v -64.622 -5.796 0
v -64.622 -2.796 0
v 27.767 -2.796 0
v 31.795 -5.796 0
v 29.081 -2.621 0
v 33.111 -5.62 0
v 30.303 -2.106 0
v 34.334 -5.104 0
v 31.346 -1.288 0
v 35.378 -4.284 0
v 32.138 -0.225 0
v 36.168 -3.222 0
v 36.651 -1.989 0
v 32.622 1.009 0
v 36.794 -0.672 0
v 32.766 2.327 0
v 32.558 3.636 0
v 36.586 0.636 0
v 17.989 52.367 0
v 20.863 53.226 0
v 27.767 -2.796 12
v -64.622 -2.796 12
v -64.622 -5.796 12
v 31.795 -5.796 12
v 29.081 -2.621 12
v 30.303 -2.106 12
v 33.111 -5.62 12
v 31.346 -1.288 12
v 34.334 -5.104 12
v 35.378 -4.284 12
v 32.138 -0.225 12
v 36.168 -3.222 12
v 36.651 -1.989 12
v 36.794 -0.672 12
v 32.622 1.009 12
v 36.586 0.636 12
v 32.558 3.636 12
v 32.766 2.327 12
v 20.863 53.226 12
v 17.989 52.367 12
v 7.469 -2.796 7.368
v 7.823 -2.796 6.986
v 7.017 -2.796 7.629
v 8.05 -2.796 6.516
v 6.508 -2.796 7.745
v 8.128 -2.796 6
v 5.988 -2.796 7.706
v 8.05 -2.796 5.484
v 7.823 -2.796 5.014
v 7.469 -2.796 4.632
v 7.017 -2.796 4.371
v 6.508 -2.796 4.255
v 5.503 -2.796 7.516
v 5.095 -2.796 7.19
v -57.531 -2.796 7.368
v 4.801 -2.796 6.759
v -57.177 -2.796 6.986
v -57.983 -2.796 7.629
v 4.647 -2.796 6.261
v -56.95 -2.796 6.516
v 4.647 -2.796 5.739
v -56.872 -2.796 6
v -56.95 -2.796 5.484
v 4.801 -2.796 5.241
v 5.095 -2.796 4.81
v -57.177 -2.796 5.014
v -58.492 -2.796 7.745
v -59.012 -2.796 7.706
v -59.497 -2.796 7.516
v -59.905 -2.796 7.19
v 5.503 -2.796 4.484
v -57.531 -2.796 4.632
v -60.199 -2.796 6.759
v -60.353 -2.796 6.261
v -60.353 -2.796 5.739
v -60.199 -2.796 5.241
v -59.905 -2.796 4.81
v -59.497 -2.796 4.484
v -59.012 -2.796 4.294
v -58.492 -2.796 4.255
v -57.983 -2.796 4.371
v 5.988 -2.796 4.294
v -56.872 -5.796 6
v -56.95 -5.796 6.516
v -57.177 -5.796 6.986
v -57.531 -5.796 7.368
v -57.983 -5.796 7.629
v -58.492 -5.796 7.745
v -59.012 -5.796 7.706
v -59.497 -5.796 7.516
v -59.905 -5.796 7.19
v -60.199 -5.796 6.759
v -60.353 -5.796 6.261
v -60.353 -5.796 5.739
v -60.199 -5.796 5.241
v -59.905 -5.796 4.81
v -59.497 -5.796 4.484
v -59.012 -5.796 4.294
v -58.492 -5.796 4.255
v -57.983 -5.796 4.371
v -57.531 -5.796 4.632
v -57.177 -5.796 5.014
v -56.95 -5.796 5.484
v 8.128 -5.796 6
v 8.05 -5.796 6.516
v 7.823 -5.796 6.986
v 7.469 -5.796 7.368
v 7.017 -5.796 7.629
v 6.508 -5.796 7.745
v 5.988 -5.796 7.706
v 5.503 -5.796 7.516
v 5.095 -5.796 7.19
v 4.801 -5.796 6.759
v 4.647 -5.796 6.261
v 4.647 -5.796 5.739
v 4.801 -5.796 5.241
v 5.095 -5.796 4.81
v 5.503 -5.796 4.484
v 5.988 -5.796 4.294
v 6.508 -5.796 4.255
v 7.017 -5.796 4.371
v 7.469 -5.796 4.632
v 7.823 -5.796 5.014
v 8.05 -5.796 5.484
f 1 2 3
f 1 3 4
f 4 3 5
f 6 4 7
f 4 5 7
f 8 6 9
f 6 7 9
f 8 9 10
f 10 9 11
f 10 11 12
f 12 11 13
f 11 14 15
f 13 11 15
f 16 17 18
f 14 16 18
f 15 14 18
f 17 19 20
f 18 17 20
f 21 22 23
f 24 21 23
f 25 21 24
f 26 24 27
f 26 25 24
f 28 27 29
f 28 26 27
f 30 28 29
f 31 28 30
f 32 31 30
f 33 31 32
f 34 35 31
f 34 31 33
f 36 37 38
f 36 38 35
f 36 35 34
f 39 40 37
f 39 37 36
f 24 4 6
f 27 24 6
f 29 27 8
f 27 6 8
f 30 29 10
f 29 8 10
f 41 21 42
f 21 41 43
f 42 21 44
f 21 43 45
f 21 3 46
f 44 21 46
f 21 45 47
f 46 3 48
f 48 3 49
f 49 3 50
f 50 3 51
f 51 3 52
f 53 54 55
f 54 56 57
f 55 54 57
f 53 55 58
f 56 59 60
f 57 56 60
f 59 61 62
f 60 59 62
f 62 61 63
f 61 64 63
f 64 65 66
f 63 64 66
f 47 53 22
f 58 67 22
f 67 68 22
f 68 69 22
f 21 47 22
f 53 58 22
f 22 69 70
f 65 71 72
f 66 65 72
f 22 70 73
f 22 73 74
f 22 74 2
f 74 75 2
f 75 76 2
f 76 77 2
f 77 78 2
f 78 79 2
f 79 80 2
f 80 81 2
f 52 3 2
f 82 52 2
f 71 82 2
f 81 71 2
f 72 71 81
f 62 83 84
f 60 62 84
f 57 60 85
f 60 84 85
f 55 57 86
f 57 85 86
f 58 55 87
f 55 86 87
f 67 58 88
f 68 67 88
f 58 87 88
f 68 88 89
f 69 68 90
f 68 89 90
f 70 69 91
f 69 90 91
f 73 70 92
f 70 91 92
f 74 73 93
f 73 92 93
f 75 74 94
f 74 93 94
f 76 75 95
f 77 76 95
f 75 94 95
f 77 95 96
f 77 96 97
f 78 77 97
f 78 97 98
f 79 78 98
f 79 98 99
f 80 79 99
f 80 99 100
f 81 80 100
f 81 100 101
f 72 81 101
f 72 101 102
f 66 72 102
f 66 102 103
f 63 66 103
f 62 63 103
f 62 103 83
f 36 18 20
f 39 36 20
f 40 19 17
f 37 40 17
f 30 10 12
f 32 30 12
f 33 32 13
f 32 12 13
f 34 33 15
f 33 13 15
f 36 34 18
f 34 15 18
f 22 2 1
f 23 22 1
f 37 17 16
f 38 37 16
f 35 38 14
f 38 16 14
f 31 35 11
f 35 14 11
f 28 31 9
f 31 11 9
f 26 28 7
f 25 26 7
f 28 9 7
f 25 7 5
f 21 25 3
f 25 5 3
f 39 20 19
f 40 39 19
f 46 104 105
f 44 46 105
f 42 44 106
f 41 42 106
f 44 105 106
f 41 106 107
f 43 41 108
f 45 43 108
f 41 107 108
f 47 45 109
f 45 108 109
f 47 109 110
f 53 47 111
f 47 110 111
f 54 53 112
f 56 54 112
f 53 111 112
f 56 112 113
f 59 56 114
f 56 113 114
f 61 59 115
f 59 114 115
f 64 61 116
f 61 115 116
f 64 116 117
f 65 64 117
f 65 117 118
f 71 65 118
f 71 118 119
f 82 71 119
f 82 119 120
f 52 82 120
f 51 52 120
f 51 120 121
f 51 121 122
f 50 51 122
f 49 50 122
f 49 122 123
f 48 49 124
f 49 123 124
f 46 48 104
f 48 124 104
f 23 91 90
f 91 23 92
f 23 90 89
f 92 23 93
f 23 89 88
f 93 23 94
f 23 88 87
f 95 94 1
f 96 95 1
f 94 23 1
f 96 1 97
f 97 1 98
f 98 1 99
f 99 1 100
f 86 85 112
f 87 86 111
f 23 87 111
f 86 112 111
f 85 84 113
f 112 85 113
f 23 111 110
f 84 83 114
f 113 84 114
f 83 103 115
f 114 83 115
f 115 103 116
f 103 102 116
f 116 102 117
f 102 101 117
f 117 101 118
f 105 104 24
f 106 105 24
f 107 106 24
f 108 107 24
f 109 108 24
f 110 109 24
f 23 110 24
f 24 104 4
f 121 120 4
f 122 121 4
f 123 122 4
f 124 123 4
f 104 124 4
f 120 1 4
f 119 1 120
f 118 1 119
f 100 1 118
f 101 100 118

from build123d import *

# Parameters (mm, degrees)
F1_DEPTH = 12
F2_R     = 1.75
F3_DEPTH = 25
F4_R     = 1.75
F5_DEPTH = 3


with BuildPart() as f1:
    # F0 (on Top) → F1 (new body)
    with BuildSketch(Plane.XY):
        with BuildLine():
            Line((27.767113, -2.79632), (-64.62246, -2.79632))
            Line((-64.62246, -2.79632), (-64.62246, -5.79632))
            Line((-64.62246, -5.79632), (31.795225, -5.79632))
            ThreePointArc((31.795225, -5.79632), (33.739366, -5.402871), (35.37754, -4.284446))
            ThreePointArc((35.37754, -4.284446), (36.650982, -1.988637), (36.585713, 0.635888))
            Line((36.585713, 0.635888), (20.862872, 53.226081))
            Line((20.862872, 53.226081), (17.988579, 52.366756))
            Line((17.988579, 52.366756), (32.557601, 3.635888))
            ThreePointArc((32.557601, 3.635888), (31.777165, -0.78287), (27.767113, -2.79632))
        make_face()
    extrude(amount=F1_DEPTH)

    # F2 (on face) → F3 (cut)
    with BuildSketch(Plane.XZ.offset(5.79632)):
        with Locations((-58.62246, 6)):
            Circle(F2_R)
    extrude(amount=-F3_DEPTH, mode=Mode.SUBTRACT)

    # F4 (on face) → F5 (cut)
    with BuildSketch(Plane.XZ.offset(5.79632)):
        with Locations((6.37754, 6)):
            Circle(F4_R)
    extrude(amount=-F5_DEPTH, mode=Mode.SUBTRACT)


solid = f1.part
